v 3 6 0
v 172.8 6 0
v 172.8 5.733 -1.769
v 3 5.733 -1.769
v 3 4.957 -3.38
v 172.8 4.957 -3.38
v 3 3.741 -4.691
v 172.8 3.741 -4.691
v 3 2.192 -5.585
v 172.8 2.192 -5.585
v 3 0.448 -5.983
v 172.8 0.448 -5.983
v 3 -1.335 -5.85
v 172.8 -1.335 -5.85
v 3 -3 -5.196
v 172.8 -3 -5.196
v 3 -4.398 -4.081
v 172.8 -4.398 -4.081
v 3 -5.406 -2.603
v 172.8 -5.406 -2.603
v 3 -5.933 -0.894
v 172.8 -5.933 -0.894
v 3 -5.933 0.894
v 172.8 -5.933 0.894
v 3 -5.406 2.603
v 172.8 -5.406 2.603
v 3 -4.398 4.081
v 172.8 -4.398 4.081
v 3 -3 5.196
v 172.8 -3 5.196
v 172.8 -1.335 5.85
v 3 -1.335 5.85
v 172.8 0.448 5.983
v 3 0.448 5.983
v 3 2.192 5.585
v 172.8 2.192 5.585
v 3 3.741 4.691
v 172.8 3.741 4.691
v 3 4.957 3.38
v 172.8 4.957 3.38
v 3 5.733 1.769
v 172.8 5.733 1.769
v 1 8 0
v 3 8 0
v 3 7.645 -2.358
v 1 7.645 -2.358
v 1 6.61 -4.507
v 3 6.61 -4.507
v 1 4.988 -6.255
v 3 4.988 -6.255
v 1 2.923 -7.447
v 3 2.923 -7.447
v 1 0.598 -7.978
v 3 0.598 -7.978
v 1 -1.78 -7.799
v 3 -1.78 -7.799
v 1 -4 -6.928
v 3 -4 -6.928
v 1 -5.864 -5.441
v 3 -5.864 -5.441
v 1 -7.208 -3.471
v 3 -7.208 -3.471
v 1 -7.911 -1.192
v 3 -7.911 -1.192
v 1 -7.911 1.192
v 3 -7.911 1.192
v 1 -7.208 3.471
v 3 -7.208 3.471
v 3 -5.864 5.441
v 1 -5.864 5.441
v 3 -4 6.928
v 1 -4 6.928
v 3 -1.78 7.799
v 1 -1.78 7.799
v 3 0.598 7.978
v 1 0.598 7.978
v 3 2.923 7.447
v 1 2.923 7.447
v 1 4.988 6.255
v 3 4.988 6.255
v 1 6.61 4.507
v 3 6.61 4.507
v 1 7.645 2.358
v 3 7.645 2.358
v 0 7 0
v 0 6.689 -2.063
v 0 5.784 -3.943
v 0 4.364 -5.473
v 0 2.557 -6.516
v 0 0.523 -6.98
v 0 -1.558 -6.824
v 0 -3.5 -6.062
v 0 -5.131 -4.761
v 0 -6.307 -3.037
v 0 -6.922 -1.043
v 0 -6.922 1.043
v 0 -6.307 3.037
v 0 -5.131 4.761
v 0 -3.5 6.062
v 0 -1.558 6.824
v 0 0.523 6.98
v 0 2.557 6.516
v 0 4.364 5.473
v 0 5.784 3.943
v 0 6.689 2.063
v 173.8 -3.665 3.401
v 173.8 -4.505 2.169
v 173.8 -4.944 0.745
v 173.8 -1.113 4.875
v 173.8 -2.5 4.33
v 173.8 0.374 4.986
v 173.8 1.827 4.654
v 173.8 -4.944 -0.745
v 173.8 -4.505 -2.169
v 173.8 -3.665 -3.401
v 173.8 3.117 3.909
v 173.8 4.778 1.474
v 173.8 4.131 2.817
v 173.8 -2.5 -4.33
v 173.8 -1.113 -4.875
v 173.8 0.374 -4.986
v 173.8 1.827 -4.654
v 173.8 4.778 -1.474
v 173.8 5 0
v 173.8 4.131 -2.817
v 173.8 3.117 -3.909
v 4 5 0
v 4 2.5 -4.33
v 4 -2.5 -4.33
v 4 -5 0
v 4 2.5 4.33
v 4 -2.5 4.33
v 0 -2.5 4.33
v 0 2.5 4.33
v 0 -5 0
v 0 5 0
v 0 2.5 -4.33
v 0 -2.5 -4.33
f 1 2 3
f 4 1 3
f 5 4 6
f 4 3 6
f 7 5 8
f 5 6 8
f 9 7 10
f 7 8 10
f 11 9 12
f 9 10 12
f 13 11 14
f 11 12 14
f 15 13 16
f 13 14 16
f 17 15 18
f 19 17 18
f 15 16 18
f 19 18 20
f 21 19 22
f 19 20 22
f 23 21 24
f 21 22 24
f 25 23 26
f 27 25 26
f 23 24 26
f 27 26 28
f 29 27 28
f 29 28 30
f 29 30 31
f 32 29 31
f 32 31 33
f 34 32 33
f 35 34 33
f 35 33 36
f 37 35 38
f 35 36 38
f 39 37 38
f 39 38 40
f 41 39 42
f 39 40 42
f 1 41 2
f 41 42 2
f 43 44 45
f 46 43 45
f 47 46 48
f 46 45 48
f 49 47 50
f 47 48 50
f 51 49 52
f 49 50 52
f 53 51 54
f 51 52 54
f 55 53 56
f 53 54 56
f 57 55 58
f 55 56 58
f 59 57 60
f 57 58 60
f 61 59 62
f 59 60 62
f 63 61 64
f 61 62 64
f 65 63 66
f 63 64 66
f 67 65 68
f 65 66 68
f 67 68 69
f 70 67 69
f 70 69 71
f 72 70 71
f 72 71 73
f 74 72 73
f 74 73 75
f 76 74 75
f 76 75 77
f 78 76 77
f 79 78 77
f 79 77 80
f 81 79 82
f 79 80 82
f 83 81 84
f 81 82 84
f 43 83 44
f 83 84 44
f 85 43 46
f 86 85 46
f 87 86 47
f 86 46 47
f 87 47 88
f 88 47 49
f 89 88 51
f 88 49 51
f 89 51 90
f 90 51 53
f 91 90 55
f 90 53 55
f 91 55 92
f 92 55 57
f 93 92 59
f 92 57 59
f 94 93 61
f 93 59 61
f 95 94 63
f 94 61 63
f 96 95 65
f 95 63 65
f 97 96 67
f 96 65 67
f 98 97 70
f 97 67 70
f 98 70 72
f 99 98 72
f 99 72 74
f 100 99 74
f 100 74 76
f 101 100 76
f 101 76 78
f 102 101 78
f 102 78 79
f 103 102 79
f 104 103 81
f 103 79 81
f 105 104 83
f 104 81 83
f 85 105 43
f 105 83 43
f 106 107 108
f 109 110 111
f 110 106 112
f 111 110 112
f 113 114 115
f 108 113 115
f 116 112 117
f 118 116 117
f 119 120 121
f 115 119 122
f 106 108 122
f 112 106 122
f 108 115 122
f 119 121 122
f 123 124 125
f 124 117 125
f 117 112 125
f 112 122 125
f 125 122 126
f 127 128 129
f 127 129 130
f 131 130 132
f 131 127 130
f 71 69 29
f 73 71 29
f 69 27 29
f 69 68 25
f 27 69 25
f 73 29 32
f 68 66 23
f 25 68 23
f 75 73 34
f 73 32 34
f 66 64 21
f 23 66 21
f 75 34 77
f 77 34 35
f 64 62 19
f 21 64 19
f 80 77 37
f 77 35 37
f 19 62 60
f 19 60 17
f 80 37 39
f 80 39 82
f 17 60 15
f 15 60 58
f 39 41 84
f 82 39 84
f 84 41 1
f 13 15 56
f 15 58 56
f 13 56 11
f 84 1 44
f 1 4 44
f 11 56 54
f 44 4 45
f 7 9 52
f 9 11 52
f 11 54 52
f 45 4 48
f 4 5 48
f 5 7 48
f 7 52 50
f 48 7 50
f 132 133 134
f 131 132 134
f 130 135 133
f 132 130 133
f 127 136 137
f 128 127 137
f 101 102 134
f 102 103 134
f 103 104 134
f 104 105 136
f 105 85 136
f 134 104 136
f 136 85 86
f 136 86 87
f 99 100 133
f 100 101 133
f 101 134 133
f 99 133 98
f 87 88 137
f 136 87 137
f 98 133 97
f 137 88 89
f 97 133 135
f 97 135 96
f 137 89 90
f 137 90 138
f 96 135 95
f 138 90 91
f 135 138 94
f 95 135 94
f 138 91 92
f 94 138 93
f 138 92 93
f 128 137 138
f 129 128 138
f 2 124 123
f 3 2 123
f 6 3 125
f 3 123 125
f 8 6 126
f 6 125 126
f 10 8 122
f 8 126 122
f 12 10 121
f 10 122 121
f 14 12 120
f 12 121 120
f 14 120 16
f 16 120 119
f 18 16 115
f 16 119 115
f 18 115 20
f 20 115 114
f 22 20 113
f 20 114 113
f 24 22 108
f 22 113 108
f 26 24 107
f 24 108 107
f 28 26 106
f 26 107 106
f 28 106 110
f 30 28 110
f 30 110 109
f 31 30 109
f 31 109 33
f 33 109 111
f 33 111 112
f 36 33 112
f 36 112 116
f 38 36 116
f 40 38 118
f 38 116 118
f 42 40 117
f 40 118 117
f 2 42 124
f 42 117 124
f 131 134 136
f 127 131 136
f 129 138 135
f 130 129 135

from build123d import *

# Parameters (mm, degrees)
CUT_EXTRUDE1_DEPTH = 4
CHAMFER1_SIZE      = 1


with BuildPart() as part:
    # Sketch1 → Revolve1 (revolve)
    with BuildSketch(Plane.XY):
        Polygon((0, 0), (0, 8), (3, 8), (3, 6), (173.8, 6), (173.8, 0), align=None)
    revolve(axis=Axis((173.8, 0, 0), (-1, 0, 0)))

    # Sketch2 → Cut-Extrude1 (cut)
    with BuildSketch(Plane.ZY):
        Polygon((0, 5), (-4.330127019, 2.5), (-4.330127019, -2.5), (0, -5), (4.330127019, -2.5), (4.330127019, 2.5), align=None)
    extrude(amount=-CUT_EXTRUDE1_DEPTH, mode=Mode.SUBTRACT)

    # Chamfer1
    chamfer1_edges = [part.edges().sort_by_distance(p)[0] for p in [
        (173.8, -6, 0),
        (0, -8, 0),
    ]]
    chamfer(chamfer1_edges, length=CHAMFER1_SIZE)


solid = part.part
